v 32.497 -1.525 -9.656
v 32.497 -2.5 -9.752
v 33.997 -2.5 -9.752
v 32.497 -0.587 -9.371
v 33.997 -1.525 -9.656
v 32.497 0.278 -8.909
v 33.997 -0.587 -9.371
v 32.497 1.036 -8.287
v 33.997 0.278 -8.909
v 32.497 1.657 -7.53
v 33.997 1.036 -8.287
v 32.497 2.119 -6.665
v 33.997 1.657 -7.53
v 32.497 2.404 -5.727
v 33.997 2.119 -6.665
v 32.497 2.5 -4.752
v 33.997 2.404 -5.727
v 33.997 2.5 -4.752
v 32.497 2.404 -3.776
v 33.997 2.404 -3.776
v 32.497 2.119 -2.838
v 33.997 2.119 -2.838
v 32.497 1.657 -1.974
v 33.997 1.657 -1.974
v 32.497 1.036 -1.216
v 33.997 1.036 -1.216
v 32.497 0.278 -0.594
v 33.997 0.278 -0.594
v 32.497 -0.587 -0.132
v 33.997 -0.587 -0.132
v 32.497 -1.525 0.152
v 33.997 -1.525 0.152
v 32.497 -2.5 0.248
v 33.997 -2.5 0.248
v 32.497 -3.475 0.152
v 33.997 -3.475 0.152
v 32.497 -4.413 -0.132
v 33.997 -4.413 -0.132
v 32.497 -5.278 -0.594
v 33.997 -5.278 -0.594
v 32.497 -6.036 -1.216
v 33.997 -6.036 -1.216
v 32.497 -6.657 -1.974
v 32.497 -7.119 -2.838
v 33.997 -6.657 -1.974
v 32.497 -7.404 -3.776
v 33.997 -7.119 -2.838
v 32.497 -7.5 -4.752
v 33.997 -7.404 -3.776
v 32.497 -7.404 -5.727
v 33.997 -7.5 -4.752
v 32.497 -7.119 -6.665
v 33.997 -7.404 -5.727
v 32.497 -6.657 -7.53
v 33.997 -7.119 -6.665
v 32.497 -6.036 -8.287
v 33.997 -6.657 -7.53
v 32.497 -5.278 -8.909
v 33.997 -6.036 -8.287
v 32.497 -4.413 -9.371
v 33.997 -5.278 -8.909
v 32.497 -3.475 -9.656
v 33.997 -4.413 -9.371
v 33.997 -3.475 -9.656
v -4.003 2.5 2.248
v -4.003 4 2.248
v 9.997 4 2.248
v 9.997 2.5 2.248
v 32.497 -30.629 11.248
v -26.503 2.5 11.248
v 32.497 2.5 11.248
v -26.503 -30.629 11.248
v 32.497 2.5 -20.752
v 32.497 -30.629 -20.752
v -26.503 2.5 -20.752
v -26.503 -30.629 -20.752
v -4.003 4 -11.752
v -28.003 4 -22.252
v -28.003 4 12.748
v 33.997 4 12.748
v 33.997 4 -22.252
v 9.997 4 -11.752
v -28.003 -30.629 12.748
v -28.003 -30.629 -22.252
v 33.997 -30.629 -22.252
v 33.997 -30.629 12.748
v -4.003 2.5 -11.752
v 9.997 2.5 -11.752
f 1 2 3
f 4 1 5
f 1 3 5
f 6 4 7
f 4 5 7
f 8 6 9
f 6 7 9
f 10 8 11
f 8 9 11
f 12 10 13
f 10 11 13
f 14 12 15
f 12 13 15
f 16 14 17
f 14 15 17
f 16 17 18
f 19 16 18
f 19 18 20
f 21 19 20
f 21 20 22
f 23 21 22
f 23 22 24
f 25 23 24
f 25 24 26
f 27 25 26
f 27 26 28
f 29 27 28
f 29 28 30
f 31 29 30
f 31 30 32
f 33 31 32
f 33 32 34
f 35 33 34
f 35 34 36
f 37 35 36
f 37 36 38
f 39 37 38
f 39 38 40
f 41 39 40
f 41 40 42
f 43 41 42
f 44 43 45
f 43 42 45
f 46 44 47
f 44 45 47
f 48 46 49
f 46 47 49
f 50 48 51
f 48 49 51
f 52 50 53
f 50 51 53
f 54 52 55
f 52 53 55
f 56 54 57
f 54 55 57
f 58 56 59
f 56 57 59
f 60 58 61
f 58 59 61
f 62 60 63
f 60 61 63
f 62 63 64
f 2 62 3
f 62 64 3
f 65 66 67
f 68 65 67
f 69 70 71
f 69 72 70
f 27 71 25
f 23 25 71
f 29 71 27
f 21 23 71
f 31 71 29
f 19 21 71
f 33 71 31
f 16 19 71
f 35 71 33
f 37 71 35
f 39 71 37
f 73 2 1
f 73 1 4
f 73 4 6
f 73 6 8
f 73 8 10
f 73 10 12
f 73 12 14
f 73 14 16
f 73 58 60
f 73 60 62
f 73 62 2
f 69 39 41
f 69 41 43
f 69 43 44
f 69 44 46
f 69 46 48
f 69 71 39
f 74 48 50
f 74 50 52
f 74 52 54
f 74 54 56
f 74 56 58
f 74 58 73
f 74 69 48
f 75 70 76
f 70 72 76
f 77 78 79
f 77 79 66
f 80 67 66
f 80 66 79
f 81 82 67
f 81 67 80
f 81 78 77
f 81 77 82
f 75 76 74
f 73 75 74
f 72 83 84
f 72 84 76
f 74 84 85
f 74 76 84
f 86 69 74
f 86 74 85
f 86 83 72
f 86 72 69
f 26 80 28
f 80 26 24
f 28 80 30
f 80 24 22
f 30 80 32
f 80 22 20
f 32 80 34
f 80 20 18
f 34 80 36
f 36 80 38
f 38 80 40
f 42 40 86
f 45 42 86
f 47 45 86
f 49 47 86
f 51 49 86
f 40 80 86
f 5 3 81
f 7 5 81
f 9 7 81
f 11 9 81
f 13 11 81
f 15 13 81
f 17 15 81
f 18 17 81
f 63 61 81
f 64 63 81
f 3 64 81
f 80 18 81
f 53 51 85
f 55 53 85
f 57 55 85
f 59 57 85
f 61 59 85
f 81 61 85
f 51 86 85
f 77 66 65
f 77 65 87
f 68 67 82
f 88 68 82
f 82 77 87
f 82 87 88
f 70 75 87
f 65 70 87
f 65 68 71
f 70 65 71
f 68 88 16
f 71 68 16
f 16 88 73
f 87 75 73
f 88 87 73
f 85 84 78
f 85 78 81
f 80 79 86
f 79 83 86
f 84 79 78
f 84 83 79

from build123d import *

# Parameters (mm, degrees)
SKETCH_1_W          = 62
SKETCH_1_H          = 35
EXTRUDE_1_DEPTH     = 1.5
SKETCH_2_W          = 62
SKETCH_2_H          = 35
EXTRUDE_2_DEPTH     = 30.629158
SKETCH_3_W          = 59
SKETCH_3_H          = 32
CUT_EXTRUDE_1_DEPTH = 41
SKETCH_4_W          = 62
SKETCH_4_H          = 35
SKETCH_4_W_2        = 59
SKETCH_4_H_2        = 32
EXTRUDE_3_DEPTH     = 1
SKETCH_5_W          = 62
SKETCH_5_H          = 35
EXTRUDE_4_DEPTH     = 1.5
SKETCH_8_R          = 5
CUT_EXTRUDE_3_DEPTH = 1.5
CUT_EXTRUDE_4_REACH = 36.629
SKETCH_10_W         = 14
SKETCH_10_H         = 14


with BuildPart() as part:
    # 草图1 → 凸台-拉伸1 (new body)
    with BuildSketch(Plane(origin=(0, 0, 0), x_dir=(1, 0, 0), z_dir=(0, 1, 0))):
        with Locations((2.996831225, 4.751847291)):
            Rectangle(SKETCH_1_W, SKETCH_1_H)
    extrude(amount=EXTRUDE_1_DEPTH)

    # 草图2 → 凸台-拉伸2 (add)
    with BuildSketch(Plane.XZ):
        with Locations((2.996831225, -4.751847291)):
            Rectangle(SKETCH_2_W, SKETCH_2_H)
    extrude(amount=EXTRUDE_2_DEPTH)

    # 草图3 → 切除-拉伸1 (cut)
    with BuildSketch(Plane.XZ.offset(30.629158461)):
        with Locations((2.996831225, -4.751847291)):
            Rectangle(SKETCH_3_W, SKETCH_3_H)
    extrude(amount=-CUT_EXTRUDE_1_DEPTH, mode=Mode.SUBTRACT)

    # 草图4 → 凸台-拉伸3 (add)
    with BuildSketch(Plane(origin=(0, 1.5, 0), x_dir=(1, 0, 0), z_dir=(0, 1, 0))):
        with Locations((2.996831225, 4.751847291)):
            Rectangle(SKETCH_4_W, SKETCH_4_H)
        with Locations((2.996831225, 4.751847291)):
            Rectangle(SKETCH_4_W_2, SKETCH_4_H_2, mode=Mode.SUBTRACT)
    extrude(amount=EXTRUDE_3_DEPTH)

    # 草图5 → 凸台-拉伸4 (add)
    with BuildSketch(Plane(origin=(0, 2.5, 0), x_dir=(1, 0, 0), z_dir=(0, 1, 0))):
        with Locations((2.996831225, 4.751847291)):
            Rectangle(SKETCH_5_W, SKETCH_5_H)
    extrude(amount=EXTRUDE_4_DEPTH)

    # 草图8 → 切除-拉伸3 (cut)
    with BuildSketch(Plane(origin=(33.996831225, 0, 0), x_dir=(0, 0, -1), z_dir=(1, 0, 0))):
        with Locations((4.751847291, -2.5)):
            Circle(SKETCH_8_R)
    extrude(amount=-CUT_EXTRUDE_3_DEPTH, mode=Mode.SUBTRACT)

    # 草图10 → 切除-拉伸4 (cut, up to next)
    with BuildSketch(Plane(origin=(0, 4, 0), x_dir=(1, 0, 0), z_dir=(0, 1, 0)), mode=Mode.PRIVATE) as cut_extrude_4_sk1:
        with Locations((2.996831225, 4.751847291)):
            Rectangle(SKETCH_10_W, SKETCH_10_H)
    cut_extrude_4_tool1 = extrude(cut_extrude_4_sk1.sketch, amount=-CUT_EXTRUDE_4_REACH, mode=Mode.PRIVATE) & part.part
    add(cut_extrude_4_tool1.solids().sort_by_distance((2.996831, 4, -4.751847))[0], mode=Mode.SUBTRACT)


solid = part.part
